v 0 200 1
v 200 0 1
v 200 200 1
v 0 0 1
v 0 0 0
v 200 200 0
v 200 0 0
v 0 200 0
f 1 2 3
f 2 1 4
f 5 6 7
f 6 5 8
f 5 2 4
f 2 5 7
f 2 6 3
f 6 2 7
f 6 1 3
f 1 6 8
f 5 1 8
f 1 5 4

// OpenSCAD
// file: ../lib/m3screw.scad
/**
 * Martin Egli
 * 2021-11-01
 * M3 screw cut outs
 */

module m3ScrewCut(len = 10, loc_res = 32) {
    translate([0, 0, 0])
    cylinder(d = 3.2, h = len, $fn = loc_res);
}

module m3SinkHeadCut(len = 4, loc_res = 32) {
    translate([0, 0, 0])
    cylinder(d1 = 3.2, d2 = 6.6, h = 2, $fn = loc_res);
    translate([0, 0, 2])
    cylinder(d = 6.6, h = len, $fn = loc_res);
}
module m3CylinderHeadCut(len = 4, loc_res = 32) {
    translate([0, 0, 0])
    cylinder(d = 6, h = len, $fn = loc_res);
}

module m3NutCut() {
    translate([0, 0, 0])
    cylinder(d = 6.6, h = 4, $fn = 6);
}

module m3SinkHeadScewNutCut(len = 10, loc_res = 32) {
    translate([0, 0, len])
    m3SinkHeadCut(4, loc_res);
    m3ScrewCut(len+1, loc_res);
    m3NutCut();
}

module m3CylinderHeadScewNutCut(len = 10, loc_res = 32) {
    translate([0, 0, len])
    m3CylinderHeadCut(4, loc_res);
    m3ScrewCut(len+1, loc_res);
    m3NutCut();
}

m3SinkHeadScewNutCut(20);
//m3CylinderHeadScewNutCut(15);
// file: stparts.scad
/**
 * Martin Egli
 * 2021-11-17
 * parts for platten stirling
 */

use <../lib/m3screw.scad>

module aluSheet(xwid = 200, ywid = 200, th = 1) {
    color("Silver")
    translate([0, 0, 0])
    cube([xwid, ywid, th]);
}

module heatExchangerSimple(xwid = 200, ywid = 200, th = 15, loc_res = 32) {
    wall_th = 3;
    m3_clear = 3;
    nb_screws = 6;
    m3_dist = (xwid-2*m3_clear)/(nb_screws-1);
    indent_rad = 4;
    
    difference() {
        union() {
            difference() {
                translate([0, 0, 0])
                cube([xwid, ywid, th]);
                
                hull() {
                    translate([(wall_th+indent_rad), (wall_th+indent_rad), (wall_th+indent_rad)])
                    sphere(r = indent_rad, $fn = loc_res);
                    translate([xwid-(wall_th+indent_rad), (wall_th+indent_rad), (wall_th+indent_rad)])
                    sphere(r = indent_rad, $fn = loc_res);
                    translate([xwid-(wall_th+indent_rad), ywid+(wall_th+indent_rad), (wall_th+indent_rad)])
                    sphere(r = indent_rad, $fn = loc_res);
                    translate([(wall_th+indent_rad), ywid+(wall_th+indent_rad), (wall_th+indent_rad)])
                    sphere(r = indent_rad, $fn = loc_res);
                    
                    translate([(wall_th+indent_rad), (wall_th+indent_rad), th+(wall_th+indent_rad)])
                    sphere(r = indent_rad, $fn = loc_res);
                    translate([xwid-(wall_th+indent_rad), (wall_th+indent_rad), th+(wall_th+indent_rad)])
                    sphere(r = indent_rad, $fn = loc_res);
                    translate([xwid-(wall_th+indent_rad), ywid+(wall_th+indent_rad), th+(wall_th+indent_rad)])
                    sphere(r = indent_rad, $fn = loc_res);
                    translate([(wall_th+indent_rad), ywid+(wall_th+indent_rad), th+(wall_th+indent_rad)])
                    sphere(r = indent_rad, $fn = loc_res);
                }
            }
            for(n = [0: 1: nb_screws-1]) {
                translate([n*m3_dist+m3_clear, m3_clear, 0])
                cylinder(d = 6, h = th, $fn = loc_res);
            }
            for(n = [0: 1: nb_screws-1]) {
                translate([m3_clear, n*m3_dist+m3_clear, 0])
                cylinder(d = 6, h = th, $fn = loc_res);
            }
            for(n = [0: 1: nb_screws-1]) {
                translate([n*m3_dist+m3_clear, 5*m3_dist+m3_clear, 0])
                cylinder(d = 6, h = th, $fn = loc_res);
            }
            for(n = [0: 1: nb_screws-1]) {
                translate([5*m3_dist+m3_clear, n*m3_dist+m3_clear, 0])
                cylinder(d = 6, h = th, $fn = loc_res);
            }
        }
        for(n = [0: 1: nb_screws-1]) {
            translate([n*m3_dist+m3_clear, m3_clear, 22])
            rotate([180, 0, 0])
            m3SinkHeadScewNutCut(20);
        }
        for(n = [0: 1: nb_screws-1]) {
            translate([m3_clear, n*m3_dist+m3_clear, 22])
            rotate([180, 0, 0])
            m3SinkHeadScewNutCut(20);
        }
        for(n = [0: 1: nb_screws-1]) {
            translate([n*m3_dist+m3_clear, 5*m3_dist+m3_clear, 22])
            rotate([180, 0, 0])
            m3SinkHeadScewNutCut(20);
        }
        for(n = [0: 1: nb_screws-1]) {
            translate([5*m3_dist+m3_clear, n*m3_dist+m3_clear, 22])
            rotate([180, 0, 0])
            m3SinkHeadScewNutCut(20);
        }
    }
}

heatExchangerSimple();
*translate([0, 0, 15])
aluSheet();
// main file
/**
 * Martin Egli
 * 2021-11-17
 */

use <stparts.scad>

aluSheet();
